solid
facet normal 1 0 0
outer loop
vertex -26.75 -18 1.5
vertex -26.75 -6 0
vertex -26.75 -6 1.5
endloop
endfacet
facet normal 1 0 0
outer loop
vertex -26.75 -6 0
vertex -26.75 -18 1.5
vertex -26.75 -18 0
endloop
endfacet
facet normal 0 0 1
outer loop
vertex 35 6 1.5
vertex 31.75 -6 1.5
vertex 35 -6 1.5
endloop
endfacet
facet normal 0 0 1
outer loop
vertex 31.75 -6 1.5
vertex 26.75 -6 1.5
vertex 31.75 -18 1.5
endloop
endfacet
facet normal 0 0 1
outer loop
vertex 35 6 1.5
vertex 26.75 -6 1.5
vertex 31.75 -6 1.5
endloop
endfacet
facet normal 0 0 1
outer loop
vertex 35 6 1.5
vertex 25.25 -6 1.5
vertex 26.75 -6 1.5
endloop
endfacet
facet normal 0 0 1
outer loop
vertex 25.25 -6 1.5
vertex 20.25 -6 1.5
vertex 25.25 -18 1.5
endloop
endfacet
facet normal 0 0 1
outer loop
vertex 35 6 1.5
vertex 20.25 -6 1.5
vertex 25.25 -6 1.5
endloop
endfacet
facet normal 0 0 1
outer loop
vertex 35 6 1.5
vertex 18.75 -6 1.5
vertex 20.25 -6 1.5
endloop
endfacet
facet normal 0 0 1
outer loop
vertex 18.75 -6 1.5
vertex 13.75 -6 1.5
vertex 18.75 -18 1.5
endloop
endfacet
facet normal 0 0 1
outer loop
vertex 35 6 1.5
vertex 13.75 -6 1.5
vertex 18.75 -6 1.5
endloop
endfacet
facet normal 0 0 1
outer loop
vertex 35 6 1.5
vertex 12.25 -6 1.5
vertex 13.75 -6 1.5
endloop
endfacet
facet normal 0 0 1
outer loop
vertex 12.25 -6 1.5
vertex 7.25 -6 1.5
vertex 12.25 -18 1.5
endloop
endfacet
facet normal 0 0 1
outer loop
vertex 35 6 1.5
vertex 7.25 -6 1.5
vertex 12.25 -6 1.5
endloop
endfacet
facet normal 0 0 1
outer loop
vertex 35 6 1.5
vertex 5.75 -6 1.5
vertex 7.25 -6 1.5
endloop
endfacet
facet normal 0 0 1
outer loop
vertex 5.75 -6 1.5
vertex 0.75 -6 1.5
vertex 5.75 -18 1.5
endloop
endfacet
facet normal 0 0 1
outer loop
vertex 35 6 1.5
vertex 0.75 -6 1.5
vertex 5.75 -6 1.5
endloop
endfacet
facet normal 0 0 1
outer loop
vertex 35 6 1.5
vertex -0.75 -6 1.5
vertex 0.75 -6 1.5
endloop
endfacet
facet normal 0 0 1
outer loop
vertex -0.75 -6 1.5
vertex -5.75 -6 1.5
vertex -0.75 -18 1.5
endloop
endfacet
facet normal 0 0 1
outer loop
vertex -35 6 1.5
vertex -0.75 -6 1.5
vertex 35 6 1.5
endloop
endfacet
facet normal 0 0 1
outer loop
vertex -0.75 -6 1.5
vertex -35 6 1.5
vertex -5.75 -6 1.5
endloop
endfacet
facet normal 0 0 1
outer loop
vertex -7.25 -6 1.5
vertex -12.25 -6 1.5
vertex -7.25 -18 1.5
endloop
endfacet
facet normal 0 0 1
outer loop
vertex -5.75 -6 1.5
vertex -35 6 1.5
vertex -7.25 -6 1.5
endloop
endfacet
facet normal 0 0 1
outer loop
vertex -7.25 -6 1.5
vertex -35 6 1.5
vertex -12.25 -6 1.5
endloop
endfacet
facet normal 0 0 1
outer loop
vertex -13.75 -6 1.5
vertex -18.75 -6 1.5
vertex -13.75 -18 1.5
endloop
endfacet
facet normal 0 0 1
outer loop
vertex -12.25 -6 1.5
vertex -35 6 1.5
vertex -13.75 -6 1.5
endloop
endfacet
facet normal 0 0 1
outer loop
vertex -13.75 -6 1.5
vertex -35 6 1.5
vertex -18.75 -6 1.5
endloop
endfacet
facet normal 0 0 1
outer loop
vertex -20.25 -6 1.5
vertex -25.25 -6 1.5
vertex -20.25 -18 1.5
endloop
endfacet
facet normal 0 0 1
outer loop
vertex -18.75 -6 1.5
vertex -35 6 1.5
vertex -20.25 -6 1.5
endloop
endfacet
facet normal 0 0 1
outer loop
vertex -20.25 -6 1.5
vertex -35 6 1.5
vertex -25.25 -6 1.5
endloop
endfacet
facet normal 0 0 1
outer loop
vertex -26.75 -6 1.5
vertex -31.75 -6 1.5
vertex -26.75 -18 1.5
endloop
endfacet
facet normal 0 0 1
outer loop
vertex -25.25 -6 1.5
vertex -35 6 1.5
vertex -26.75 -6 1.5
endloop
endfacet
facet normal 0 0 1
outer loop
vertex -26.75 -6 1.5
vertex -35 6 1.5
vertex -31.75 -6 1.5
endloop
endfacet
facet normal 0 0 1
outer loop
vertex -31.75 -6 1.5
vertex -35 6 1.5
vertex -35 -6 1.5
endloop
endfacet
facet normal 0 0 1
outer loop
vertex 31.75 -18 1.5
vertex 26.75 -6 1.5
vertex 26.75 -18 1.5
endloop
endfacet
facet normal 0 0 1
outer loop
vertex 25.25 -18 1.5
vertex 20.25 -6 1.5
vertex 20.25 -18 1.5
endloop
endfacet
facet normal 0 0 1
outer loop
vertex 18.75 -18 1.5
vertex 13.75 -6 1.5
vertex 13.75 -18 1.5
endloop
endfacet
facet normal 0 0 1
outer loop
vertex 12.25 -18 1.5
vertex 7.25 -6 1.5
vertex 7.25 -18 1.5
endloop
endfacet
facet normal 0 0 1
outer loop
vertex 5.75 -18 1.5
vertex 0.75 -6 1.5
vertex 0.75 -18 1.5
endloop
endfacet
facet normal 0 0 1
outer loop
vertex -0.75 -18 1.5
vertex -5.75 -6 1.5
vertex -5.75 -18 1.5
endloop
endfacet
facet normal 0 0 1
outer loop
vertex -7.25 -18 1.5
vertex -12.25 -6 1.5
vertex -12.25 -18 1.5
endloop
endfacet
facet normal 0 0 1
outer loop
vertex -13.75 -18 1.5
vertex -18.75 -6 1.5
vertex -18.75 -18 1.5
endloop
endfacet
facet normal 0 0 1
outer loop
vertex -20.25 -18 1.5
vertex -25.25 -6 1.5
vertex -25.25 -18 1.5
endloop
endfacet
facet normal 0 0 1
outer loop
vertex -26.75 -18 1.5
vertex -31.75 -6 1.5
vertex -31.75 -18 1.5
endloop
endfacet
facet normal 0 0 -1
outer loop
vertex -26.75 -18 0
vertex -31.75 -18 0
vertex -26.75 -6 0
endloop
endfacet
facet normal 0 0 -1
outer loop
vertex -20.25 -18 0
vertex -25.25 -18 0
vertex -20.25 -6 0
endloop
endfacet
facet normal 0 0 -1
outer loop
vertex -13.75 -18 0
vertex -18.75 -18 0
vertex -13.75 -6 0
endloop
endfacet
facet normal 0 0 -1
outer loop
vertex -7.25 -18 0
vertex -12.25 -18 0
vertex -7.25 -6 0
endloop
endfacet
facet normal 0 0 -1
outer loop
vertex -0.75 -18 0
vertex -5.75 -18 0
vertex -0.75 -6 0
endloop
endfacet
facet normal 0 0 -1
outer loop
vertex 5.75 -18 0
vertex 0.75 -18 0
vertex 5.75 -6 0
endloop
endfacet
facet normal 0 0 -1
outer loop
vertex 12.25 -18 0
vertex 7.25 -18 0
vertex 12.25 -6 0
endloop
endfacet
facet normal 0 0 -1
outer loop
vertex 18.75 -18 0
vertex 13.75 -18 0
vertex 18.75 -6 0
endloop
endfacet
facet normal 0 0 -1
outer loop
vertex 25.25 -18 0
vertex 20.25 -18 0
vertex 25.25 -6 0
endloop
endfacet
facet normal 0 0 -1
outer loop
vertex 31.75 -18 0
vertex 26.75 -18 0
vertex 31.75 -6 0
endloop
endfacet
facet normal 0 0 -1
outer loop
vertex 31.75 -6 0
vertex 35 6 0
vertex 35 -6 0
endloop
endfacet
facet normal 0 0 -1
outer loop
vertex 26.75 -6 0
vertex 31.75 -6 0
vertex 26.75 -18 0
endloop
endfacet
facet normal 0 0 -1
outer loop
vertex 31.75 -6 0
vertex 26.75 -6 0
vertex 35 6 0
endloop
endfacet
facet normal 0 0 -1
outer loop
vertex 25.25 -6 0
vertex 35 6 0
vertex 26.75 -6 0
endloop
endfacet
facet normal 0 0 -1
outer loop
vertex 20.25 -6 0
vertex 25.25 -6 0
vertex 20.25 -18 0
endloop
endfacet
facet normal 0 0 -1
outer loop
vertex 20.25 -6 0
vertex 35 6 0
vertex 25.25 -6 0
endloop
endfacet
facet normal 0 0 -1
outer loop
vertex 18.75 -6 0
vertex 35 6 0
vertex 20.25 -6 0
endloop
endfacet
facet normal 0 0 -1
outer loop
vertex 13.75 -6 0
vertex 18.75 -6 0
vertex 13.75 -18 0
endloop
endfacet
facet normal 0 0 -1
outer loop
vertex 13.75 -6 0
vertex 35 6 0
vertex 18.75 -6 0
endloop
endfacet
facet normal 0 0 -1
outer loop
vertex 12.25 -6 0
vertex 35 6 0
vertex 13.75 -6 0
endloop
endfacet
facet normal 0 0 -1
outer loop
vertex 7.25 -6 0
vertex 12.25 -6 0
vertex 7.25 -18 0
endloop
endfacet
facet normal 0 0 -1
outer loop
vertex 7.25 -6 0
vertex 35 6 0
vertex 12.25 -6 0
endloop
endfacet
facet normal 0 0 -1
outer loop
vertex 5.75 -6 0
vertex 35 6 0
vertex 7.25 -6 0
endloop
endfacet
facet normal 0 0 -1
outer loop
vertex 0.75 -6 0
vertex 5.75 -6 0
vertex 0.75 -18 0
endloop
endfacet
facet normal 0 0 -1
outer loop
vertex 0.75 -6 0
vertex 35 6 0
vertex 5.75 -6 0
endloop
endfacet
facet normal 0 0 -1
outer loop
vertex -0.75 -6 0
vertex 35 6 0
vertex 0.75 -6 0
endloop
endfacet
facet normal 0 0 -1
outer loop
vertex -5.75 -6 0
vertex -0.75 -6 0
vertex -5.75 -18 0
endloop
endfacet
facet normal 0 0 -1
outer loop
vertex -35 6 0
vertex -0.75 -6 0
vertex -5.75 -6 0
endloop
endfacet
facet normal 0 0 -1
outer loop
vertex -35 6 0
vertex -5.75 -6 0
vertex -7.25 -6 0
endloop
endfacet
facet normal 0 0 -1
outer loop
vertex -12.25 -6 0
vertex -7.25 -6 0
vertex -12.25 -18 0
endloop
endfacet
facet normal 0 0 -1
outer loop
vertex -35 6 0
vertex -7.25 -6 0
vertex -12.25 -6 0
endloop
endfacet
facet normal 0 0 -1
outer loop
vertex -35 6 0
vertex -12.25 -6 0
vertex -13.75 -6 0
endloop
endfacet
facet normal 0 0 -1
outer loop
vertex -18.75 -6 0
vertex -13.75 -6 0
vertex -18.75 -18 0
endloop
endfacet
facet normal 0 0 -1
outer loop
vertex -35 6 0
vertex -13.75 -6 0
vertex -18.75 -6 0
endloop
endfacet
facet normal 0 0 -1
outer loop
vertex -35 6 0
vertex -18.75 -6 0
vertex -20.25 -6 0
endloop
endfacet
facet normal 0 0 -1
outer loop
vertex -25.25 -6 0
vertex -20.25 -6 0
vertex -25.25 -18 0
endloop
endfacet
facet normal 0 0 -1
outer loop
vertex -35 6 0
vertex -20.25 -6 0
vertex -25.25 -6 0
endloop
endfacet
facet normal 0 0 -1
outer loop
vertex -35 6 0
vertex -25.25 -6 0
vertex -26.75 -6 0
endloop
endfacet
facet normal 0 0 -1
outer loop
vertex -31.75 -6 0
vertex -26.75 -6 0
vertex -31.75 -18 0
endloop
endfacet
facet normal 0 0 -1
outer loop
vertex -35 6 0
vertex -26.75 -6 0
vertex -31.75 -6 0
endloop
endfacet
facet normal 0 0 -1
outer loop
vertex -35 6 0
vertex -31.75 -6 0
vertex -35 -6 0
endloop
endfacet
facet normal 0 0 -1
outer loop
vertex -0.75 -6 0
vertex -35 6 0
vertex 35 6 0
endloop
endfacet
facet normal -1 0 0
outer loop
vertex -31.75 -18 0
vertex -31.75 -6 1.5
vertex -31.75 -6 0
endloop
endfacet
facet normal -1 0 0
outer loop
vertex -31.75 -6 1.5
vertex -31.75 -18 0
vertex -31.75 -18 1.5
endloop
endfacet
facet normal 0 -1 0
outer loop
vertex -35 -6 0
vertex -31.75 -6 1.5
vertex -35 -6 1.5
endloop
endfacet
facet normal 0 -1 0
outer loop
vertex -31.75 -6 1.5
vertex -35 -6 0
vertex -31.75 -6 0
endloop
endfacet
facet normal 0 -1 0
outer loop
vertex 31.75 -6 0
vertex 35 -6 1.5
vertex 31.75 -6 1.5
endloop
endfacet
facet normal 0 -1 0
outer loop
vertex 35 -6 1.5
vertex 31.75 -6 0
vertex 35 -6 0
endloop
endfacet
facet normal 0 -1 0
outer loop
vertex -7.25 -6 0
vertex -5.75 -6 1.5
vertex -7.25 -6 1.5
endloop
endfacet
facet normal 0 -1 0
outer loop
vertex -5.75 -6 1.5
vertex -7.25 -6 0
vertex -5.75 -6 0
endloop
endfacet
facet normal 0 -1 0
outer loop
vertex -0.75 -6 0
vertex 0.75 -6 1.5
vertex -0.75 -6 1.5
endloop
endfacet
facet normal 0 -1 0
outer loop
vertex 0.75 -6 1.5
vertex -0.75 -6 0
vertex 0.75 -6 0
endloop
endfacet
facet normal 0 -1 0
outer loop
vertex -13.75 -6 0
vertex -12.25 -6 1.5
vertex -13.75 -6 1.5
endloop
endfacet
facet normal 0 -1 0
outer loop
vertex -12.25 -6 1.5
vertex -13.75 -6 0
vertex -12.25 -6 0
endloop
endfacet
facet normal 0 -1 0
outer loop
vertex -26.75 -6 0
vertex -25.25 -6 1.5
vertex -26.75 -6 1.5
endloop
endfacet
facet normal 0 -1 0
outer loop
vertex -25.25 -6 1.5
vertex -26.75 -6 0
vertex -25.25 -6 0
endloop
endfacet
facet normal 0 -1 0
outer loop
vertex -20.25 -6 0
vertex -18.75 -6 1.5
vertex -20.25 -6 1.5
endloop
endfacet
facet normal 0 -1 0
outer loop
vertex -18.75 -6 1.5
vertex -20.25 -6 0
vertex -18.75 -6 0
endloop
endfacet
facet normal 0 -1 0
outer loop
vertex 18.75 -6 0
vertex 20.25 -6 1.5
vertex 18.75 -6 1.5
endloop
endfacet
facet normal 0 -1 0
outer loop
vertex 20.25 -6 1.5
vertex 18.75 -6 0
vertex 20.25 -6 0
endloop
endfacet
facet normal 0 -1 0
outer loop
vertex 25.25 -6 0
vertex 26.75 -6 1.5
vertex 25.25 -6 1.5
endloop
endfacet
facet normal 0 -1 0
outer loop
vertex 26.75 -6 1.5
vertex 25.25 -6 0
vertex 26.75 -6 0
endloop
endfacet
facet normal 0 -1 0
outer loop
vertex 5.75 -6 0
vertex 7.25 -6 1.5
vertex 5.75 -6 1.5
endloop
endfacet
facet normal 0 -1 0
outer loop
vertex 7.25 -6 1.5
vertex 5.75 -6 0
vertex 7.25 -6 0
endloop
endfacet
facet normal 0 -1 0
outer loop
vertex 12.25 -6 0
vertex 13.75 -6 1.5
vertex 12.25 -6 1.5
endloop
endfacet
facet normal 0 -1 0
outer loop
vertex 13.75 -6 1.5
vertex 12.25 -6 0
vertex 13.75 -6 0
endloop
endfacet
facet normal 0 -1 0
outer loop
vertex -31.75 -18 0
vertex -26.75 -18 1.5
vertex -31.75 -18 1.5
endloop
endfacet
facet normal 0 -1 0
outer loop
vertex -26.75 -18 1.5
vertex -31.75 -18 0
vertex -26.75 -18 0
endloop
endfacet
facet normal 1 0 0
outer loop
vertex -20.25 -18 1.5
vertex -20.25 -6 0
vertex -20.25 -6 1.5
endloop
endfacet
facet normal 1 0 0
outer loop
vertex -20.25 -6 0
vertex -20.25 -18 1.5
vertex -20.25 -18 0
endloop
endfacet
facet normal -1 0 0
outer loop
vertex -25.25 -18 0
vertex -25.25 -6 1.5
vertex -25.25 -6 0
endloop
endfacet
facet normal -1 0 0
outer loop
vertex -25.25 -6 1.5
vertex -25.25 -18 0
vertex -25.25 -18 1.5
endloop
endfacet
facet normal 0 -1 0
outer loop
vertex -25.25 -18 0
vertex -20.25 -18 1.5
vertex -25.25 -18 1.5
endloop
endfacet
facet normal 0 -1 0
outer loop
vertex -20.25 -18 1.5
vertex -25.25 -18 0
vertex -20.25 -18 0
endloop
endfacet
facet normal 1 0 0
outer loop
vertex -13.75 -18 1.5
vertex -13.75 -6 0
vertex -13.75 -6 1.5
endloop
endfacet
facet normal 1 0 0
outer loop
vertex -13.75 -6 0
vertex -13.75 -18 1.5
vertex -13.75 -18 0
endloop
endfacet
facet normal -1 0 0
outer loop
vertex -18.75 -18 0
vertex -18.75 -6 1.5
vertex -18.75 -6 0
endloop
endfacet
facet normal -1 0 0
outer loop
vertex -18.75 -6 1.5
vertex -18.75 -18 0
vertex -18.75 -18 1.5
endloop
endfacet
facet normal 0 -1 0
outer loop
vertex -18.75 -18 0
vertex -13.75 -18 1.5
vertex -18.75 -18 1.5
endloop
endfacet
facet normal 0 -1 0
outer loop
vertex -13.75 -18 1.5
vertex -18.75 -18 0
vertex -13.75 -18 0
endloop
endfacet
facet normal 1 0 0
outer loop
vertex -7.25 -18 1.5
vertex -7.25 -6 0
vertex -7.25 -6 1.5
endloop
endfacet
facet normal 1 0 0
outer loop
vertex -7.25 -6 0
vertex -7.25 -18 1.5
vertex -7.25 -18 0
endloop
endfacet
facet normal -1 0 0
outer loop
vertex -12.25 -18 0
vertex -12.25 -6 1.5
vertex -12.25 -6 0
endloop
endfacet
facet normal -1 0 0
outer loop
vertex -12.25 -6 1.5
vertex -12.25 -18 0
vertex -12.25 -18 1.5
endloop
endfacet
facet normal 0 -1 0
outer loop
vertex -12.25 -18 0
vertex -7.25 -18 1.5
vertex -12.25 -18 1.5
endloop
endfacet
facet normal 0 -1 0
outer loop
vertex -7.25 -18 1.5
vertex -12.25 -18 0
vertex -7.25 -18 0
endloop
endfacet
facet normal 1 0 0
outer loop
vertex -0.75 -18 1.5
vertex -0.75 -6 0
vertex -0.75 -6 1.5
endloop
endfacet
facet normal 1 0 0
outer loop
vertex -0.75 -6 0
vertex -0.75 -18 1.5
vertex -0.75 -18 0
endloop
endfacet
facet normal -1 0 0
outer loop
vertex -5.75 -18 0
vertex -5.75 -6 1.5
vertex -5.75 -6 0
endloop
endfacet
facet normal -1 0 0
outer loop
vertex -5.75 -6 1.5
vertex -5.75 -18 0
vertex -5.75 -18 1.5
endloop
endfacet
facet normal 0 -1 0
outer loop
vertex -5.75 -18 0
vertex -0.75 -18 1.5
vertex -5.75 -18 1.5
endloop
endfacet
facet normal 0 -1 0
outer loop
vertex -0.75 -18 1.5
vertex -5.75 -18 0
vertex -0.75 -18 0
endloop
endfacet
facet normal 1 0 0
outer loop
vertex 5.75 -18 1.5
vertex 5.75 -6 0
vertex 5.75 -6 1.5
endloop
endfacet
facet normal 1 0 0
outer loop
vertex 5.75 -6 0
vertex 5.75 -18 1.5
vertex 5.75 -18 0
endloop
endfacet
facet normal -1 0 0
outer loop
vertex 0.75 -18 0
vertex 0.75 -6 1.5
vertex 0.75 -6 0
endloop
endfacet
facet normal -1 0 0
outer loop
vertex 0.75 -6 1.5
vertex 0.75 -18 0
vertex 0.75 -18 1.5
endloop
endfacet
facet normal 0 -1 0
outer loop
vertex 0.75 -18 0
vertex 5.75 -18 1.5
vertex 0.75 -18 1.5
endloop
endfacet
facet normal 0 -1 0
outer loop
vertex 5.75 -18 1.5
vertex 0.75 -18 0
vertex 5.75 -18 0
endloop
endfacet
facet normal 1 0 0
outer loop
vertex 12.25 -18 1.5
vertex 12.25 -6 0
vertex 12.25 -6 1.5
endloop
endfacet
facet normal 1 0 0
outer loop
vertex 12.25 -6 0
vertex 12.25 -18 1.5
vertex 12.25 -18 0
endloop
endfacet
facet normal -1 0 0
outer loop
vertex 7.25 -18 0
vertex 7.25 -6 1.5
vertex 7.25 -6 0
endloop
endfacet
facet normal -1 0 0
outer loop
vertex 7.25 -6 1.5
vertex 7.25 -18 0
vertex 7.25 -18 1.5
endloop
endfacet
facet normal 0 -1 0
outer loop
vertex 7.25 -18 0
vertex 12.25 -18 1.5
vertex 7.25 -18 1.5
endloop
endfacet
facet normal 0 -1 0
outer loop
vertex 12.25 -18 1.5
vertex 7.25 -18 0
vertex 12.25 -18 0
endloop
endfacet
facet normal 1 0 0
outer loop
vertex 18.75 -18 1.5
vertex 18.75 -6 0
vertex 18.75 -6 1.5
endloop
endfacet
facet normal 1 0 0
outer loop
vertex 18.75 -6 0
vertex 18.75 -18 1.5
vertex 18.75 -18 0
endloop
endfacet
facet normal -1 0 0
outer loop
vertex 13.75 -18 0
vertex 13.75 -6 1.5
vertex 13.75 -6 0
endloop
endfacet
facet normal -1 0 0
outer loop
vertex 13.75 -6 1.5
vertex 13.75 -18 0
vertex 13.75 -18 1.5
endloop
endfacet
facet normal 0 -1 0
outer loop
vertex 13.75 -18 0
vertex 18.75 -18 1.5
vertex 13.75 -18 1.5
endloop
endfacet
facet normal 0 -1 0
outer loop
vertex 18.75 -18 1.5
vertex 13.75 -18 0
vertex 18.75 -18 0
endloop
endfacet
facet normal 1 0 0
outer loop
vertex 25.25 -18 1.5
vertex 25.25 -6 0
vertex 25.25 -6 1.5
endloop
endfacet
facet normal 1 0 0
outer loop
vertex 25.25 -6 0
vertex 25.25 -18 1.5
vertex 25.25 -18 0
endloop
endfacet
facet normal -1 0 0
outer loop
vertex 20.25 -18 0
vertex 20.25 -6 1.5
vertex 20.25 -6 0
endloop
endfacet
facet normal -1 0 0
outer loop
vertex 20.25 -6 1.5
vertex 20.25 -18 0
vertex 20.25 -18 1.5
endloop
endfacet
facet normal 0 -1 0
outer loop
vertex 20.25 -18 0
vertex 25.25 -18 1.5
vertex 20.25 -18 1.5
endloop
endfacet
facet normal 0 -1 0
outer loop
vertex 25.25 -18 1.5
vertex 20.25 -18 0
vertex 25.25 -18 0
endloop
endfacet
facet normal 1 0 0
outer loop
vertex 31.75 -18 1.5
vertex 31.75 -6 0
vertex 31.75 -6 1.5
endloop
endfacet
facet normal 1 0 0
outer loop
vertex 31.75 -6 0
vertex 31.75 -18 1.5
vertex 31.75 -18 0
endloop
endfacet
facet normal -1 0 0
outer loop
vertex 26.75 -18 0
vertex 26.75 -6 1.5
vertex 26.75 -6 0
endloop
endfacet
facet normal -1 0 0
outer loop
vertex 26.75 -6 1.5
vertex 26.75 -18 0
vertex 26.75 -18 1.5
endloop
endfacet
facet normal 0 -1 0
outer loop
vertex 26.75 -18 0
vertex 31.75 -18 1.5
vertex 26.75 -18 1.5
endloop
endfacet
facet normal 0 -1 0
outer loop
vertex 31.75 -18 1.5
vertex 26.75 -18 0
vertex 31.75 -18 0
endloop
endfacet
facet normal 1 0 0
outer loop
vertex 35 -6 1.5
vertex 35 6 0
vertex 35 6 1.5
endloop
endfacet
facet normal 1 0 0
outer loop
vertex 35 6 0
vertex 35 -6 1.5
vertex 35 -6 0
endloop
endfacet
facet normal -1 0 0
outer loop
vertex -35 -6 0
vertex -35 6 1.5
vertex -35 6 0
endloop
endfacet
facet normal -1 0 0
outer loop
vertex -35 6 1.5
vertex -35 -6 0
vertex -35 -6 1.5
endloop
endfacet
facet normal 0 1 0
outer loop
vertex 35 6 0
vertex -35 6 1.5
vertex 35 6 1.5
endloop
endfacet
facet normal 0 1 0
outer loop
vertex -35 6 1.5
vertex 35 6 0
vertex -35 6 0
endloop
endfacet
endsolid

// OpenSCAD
// 10-well comb for agarose gel casting
// Print orientation: flat on XY plane, Z = 0

$fn = 64;

// Dimensions
thickness = 1.5;        // Z thickness (mm)
spine_length = 70;      // X length of spine (mm)
spine_width = 12;       // Y width of spine (mm)
tooth_width = 5.0;      // X width of each tooth (mm)
tooth_length = 12;      // Y length of each tooth (mm)
gap_width = 1.5;        // X gap between neighbouring teeth (mm)
num_teeth = 10;         // number of teeth

// Calculate total width of teeth + gaps
total_tooth_width = num_teeth * tooth_width;
total_gap_width = (num_teeth - 1) * gap_width;
teeth_row_width = total_tooth_width + total_gap_width;

// Build the comb - position so bottom is at z=0
union() {
    // Spine (back bar) - positioned at z=0 to z=thickness
    translate([0, 0, thickness/2])
        cube([spine_length, spine_width, thickness], center = true);
    
    // Teeth - positioned at z=0 to z=thickness
    for (i = [0 : num_teeth - 1]) {
        // Calculate X position of each tooth
        // Teeth are centered on the spine, so first tooth starts at:
        // -teeth_row_width/2 + tooth_width/2
        x_pos = -teeth_row_width/2 + i * (tooth_width + gap_width) + tooth_width/2;
        
        // Position tooth: centered in X, extending from spine edge (-Y direction)
        // Spine edge is at Y = -spine_width/2 (since spine is centered at Y=0)
        // Translate to position tooth with bottom at z=0
        translate([x_pos, -spine_width/2 - tooth_length/2, thickness/2])
            cube([tooth_width, tooth_length, thickness], center = true);
    }
}
